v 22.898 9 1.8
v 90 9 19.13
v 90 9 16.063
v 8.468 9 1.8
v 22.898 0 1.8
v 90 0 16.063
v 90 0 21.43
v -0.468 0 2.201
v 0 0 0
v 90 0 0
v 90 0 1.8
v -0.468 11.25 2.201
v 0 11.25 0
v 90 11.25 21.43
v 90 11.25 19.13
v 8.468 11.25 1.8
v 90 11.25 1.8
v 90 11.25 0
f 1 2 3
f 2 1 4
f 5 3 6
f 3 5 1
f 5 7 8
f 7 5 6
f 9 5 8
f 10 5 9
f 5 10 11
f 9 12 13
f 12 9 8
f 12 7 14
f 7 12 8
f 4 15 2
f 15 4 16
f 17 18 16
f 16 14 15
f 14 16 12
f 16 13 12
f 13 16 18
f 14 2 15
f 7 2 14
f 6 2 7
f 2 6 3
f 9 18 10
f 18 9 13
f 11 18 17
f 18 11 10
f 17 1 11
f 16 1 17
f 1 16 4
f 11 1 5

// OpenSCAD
coldiameter = 17.5;
mod = coldiameter;					//this is the diameter of a column
//height = mod * 6;					//height of a column
length = 90;
width = (length * 7/6) * .618;  	//golden rectangle

angle = 12;
hl = length/cos(angle)*1.02;

pediment_end();

module pediment_end() {

	cube([length,length/8,length/50]);
	difference() {
		union() {
			rotate([0,-angle,0]) translate([0,0,-length/30])
				cube([hl,length/10,length/25]);
			rotate([0,-angle,0])	translate([0,0,0]) 
				cube([length*1.05,length/8,length/40]);
		}
	translate([length,0,0]) cube([length/25,length/8,length/2]);
	#translate([0,0,-length/25]) cube([length,length/8,length/25]);
	}
}
